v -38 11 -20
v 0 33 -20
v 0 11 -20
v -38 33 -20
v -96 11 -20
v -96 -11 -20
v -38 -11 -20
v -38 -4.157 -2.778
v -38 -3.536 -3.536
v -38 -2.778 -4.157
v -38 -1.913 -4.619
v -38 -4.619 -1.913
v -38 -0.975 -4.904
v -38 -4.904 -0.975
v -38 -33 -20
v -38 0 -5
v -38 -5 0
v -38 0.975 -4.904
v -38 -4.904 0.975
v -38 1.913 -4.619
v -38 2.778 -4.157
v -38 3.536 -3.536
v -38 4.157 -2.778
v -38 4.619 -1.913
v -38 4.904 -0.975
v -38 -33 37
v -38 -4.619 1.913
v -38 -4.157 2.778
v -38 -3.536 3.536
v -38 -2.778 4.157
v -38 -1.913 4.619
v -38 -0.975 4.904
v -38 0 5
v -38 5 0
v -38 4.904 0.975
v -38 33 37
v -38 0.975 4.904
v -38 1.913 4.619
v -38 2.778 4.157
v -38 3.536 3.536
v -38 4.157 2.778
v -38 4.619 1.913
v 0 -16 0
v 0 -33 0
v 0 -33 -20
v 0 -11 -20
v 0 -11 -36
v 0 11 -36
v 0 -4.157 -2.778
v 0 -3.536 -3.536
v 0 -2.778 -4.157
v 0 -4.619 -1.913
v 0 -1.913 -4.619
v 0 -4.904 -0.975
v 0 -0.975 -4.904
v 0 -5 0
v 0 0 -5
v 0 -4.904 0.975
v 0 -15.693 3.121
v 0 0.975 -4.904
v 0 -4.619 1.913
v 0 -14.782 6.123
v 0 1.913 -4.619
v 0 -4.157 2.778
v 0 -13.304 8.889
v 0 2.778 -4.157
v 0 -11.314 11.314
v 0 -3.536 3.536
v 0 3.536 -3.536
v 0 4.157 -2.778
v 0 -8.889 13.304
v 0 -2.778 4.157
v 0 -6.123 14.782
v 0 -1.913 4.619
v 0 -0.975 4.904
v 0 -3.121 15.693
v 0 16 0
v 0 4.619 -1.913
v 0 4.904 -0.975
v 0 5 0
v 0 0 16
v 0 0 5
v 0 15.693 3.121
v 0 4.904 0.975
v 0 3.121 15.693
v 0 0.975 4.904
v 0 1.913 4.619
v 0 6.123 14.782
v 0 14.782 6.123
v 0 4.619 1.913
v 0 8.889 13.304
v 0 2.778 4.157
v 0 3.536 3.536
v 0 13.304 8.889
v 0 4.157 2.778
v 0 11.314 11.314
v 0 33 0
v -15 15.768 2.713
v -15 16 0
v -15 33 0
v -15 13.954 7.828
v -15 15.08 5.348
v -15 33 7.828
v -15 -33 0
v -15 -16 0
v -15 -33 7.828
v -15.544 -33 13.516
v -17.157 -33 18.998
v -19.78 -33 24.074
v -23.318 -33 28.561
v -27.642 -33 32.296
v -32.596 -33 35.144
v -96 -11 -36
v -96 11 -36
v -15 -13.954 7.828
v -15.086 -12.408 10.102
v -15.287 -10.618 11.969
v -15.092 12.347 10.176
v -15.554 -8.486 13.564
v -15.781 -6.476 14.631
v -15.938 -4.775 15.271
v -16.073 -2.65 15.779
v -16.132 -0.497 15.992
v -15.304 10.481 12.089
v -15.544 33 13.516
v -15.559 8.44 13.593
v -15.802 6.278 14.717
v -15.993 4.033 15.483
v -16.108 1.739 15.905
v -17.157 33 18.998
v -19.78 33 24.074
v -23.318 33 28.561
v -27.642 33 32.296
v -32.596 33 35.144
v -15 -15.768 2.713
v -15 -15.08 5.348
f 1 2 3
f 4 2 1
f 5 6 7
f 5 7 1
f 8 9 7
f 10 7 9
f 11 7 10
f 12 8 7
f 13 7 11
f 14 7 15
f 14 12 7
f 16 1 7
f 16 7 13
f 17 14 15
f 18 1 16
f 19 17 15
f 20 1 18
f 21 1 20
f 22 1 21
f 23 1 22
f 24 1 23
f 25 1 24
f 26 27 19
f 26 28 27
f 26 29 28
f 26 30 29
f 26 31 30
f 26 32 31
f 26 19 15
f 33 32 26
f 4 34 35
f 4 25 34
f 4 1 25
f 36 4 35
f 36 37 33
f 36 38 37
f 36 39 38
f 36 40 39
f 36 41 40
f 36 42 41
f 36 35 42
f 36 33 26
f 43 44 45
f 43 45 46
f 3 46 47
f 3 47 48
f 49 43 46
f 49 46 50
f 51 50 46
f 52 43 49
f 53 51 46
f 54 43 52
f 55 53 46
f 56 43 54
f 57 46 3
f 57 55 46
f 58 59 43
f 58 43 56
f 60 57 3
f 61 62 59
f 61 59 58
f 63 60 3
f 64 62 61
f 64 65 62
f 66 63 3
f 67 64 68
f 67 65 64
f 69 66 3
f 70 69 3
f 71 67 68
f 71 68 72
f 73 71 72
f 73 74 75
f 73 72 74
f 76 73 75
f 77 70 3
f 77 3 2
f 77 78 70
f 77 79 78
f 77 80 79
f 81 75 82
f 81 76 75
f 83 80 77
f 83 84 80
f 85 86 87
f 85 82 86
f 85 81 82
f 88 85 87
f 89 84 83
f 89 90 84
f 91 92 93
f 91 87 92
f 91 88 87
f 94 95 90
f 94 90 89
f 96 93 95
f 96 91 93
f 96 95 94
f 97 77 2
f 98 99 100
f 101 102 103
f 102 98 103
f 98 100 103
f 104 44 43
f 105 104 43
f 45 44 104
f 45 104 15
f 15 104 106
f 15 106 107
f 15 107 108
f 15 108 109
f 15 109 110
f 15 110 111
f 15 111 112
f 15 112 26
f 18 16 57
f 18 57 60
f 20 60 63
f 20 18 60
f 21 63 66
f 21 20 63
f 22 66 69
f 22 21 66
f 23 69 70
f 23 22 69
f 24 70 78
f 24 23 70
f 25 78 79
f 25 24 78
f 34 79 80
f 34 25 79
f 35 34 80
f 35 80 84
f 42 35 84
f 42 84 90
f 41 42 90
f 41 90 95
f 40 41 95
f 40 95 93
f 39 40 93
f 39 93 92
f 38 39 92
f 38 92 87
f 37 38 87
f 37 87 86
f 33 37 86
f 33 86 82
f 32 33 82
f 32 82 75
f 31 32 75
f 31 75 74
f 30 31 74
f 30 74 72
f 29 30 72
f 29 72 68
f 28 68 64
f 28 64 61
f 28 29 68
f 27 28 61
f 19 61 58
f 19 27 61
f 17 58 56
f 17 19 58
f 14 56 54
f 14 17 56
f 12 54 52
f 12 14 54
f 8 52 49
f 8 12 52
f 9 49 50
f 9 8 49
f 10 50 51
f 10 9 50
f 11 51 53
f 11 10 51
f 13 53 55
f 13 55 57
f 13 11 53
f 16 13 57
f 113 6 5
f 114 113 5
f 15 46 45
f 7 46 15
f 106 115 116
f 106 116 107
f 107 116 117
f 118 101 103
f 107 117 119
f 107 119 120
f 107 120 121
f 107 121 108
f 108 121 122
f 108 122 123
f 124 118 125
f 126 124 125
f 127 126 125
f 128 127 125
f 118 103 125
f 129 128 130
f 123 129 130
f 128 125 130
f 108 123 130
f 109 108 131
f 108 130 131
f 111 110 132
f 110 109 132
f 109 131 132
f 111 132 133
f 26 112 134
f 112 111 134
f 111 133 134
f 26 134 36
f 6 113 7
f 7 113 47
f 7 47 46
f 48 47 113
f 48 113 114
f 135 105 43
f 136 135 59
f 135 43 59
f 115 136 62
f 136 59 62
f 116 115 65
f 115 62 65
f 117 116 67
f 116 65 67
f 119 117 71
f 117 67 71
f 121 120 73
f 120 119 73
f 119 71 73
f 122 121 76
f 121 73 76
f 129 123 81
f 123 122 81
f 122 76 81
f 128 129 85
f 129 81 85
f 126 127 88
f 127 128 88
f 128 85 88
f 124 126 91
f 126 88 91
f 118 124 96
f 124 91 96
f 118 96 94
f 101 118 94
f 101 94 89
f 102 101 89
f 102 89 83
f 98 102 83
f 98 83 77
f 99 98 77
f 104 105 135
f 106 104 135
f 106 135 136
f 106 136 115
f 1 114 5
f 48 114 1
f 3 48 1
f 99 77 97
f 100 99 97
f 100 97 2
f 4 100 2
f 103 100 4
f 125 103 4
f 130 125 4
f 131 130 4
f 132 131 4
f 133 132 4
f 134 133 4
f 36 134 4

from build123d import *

# Parameters (mm, degrees)
SKETCH1_R               = 5
BOSS_EXTRUDE1_DEPTH     = 15
SKETCH1_3_W             = 22
SKETCH1_3_H             = 16
BOSS_EXTRUDE2_DEPTH     = 96
SKETCH2_W               = 23
SKETCH2_H               = 57
BOSS_EXTRUDE3_DEPTH     = 66
FILLET1_R               = 30
CUT_EXTRUDE1_DEPTH      = 109.046286442
CUT_EXTRUDE1_DEPTH_BACK = 109.046286442
SKETCH1_4_R             = 5


with BuildPart() as part:
    # Sketch1 → Boss-Extrude1 (new body)
    with BuildSketch(Plane.YZ):
        with BuildLine():
            Line((16, 0), (33, 0))
            Line((33, 0), (33, -20))
            Line((33, -20), (11, -20))
            Line((11, -20), (-11, -20))
            Line((-11, -20), (-33, -20))
            Line((-33, -20), (-33, 0))
            Line((-33, 0), (-16, 0))
            ThreePointArc((-16, 0), (0, 16), (16, 0))
        make_face()
        with Locations(Location((0, 0, 0), (0, 0, 270))):
            Circle(SKETCH1_R, mode=Mode.SUBTRACT)
    extrude(amount=-BOSS_EXTRUDE1_DEPTH)

    # Sketch1<3> → Boss-Extrude2 (add)
    with BuildSketch(Plane.YZ):
        with Locations((0, -28)):
            Rectangle(SKETCH1_3_W, SKETCH1_3_H)
    extrude(amount=-BOSS_EXTRUDE2_DEPTH)

    # Sketch2 → Boss-Extrude3 (add)
    with BuildSketch(Plane(origin=(0, 33, 0), x_dir=(-1, 0, 0), z_dir=(0, 1, 0))):
        with Locations((26.5, 8.5)):
            Rectangle(SKETCH2_W, SKETCH2_H)
    extrude(amount=-BOSS_EXTRUDE3_DEPTH)

    # Fillet1
    # the kernel refuses this fillet: 30 mm, written as the material it takes off along each edge
    with BuildSketch(Plane(origin=(-15, 105.929760729, 37), x_dir=(0, 0, -1), z_dir=(0, -1, 0))) as fillet1_piece_1_section:
        with BuildLine():
            CenterArc((29.171904292, -30), FILLET1_R, 90, 76.506601178)
            Line((0, -23), (0, 0))
            Line((0, 0), (29.171904292, 0))
        make_face()
    fillet1_piece_1 = extrude(amount=211.859521458, mode=Mode.PRIVATE)
    fillet1_piece_1 = fillet1_piece_1 - Plane(origin=(-15, 0, 0), x_dir=(0, -1, 0), z_dir=(1, 0, 0)) * Cylinder(16, 541, mode=Mode.PRIVATE)
    add(fillet1_piece_1, mode=Mode.SUBTRACT)

    # Sketch1<4> → Cut-Extrude1 (cut, two sides: drawn at the far end of the back side and taken through both)
    with BuildSketch(Plane.YZ.offset(-CUT_EXTRUDE1_DEPTH_BACK)):
        with Locations(Location((0, 0, 0), (0, 0, 270))):
            Circle(SKETCH1_4_R)
    extrude(amount=CUT_EXTRUDE1_DEPTH + CUT_EXTRUDE1_DEPTH_BACK, mode=Mode.SUBTRACT)


solid = part.part
